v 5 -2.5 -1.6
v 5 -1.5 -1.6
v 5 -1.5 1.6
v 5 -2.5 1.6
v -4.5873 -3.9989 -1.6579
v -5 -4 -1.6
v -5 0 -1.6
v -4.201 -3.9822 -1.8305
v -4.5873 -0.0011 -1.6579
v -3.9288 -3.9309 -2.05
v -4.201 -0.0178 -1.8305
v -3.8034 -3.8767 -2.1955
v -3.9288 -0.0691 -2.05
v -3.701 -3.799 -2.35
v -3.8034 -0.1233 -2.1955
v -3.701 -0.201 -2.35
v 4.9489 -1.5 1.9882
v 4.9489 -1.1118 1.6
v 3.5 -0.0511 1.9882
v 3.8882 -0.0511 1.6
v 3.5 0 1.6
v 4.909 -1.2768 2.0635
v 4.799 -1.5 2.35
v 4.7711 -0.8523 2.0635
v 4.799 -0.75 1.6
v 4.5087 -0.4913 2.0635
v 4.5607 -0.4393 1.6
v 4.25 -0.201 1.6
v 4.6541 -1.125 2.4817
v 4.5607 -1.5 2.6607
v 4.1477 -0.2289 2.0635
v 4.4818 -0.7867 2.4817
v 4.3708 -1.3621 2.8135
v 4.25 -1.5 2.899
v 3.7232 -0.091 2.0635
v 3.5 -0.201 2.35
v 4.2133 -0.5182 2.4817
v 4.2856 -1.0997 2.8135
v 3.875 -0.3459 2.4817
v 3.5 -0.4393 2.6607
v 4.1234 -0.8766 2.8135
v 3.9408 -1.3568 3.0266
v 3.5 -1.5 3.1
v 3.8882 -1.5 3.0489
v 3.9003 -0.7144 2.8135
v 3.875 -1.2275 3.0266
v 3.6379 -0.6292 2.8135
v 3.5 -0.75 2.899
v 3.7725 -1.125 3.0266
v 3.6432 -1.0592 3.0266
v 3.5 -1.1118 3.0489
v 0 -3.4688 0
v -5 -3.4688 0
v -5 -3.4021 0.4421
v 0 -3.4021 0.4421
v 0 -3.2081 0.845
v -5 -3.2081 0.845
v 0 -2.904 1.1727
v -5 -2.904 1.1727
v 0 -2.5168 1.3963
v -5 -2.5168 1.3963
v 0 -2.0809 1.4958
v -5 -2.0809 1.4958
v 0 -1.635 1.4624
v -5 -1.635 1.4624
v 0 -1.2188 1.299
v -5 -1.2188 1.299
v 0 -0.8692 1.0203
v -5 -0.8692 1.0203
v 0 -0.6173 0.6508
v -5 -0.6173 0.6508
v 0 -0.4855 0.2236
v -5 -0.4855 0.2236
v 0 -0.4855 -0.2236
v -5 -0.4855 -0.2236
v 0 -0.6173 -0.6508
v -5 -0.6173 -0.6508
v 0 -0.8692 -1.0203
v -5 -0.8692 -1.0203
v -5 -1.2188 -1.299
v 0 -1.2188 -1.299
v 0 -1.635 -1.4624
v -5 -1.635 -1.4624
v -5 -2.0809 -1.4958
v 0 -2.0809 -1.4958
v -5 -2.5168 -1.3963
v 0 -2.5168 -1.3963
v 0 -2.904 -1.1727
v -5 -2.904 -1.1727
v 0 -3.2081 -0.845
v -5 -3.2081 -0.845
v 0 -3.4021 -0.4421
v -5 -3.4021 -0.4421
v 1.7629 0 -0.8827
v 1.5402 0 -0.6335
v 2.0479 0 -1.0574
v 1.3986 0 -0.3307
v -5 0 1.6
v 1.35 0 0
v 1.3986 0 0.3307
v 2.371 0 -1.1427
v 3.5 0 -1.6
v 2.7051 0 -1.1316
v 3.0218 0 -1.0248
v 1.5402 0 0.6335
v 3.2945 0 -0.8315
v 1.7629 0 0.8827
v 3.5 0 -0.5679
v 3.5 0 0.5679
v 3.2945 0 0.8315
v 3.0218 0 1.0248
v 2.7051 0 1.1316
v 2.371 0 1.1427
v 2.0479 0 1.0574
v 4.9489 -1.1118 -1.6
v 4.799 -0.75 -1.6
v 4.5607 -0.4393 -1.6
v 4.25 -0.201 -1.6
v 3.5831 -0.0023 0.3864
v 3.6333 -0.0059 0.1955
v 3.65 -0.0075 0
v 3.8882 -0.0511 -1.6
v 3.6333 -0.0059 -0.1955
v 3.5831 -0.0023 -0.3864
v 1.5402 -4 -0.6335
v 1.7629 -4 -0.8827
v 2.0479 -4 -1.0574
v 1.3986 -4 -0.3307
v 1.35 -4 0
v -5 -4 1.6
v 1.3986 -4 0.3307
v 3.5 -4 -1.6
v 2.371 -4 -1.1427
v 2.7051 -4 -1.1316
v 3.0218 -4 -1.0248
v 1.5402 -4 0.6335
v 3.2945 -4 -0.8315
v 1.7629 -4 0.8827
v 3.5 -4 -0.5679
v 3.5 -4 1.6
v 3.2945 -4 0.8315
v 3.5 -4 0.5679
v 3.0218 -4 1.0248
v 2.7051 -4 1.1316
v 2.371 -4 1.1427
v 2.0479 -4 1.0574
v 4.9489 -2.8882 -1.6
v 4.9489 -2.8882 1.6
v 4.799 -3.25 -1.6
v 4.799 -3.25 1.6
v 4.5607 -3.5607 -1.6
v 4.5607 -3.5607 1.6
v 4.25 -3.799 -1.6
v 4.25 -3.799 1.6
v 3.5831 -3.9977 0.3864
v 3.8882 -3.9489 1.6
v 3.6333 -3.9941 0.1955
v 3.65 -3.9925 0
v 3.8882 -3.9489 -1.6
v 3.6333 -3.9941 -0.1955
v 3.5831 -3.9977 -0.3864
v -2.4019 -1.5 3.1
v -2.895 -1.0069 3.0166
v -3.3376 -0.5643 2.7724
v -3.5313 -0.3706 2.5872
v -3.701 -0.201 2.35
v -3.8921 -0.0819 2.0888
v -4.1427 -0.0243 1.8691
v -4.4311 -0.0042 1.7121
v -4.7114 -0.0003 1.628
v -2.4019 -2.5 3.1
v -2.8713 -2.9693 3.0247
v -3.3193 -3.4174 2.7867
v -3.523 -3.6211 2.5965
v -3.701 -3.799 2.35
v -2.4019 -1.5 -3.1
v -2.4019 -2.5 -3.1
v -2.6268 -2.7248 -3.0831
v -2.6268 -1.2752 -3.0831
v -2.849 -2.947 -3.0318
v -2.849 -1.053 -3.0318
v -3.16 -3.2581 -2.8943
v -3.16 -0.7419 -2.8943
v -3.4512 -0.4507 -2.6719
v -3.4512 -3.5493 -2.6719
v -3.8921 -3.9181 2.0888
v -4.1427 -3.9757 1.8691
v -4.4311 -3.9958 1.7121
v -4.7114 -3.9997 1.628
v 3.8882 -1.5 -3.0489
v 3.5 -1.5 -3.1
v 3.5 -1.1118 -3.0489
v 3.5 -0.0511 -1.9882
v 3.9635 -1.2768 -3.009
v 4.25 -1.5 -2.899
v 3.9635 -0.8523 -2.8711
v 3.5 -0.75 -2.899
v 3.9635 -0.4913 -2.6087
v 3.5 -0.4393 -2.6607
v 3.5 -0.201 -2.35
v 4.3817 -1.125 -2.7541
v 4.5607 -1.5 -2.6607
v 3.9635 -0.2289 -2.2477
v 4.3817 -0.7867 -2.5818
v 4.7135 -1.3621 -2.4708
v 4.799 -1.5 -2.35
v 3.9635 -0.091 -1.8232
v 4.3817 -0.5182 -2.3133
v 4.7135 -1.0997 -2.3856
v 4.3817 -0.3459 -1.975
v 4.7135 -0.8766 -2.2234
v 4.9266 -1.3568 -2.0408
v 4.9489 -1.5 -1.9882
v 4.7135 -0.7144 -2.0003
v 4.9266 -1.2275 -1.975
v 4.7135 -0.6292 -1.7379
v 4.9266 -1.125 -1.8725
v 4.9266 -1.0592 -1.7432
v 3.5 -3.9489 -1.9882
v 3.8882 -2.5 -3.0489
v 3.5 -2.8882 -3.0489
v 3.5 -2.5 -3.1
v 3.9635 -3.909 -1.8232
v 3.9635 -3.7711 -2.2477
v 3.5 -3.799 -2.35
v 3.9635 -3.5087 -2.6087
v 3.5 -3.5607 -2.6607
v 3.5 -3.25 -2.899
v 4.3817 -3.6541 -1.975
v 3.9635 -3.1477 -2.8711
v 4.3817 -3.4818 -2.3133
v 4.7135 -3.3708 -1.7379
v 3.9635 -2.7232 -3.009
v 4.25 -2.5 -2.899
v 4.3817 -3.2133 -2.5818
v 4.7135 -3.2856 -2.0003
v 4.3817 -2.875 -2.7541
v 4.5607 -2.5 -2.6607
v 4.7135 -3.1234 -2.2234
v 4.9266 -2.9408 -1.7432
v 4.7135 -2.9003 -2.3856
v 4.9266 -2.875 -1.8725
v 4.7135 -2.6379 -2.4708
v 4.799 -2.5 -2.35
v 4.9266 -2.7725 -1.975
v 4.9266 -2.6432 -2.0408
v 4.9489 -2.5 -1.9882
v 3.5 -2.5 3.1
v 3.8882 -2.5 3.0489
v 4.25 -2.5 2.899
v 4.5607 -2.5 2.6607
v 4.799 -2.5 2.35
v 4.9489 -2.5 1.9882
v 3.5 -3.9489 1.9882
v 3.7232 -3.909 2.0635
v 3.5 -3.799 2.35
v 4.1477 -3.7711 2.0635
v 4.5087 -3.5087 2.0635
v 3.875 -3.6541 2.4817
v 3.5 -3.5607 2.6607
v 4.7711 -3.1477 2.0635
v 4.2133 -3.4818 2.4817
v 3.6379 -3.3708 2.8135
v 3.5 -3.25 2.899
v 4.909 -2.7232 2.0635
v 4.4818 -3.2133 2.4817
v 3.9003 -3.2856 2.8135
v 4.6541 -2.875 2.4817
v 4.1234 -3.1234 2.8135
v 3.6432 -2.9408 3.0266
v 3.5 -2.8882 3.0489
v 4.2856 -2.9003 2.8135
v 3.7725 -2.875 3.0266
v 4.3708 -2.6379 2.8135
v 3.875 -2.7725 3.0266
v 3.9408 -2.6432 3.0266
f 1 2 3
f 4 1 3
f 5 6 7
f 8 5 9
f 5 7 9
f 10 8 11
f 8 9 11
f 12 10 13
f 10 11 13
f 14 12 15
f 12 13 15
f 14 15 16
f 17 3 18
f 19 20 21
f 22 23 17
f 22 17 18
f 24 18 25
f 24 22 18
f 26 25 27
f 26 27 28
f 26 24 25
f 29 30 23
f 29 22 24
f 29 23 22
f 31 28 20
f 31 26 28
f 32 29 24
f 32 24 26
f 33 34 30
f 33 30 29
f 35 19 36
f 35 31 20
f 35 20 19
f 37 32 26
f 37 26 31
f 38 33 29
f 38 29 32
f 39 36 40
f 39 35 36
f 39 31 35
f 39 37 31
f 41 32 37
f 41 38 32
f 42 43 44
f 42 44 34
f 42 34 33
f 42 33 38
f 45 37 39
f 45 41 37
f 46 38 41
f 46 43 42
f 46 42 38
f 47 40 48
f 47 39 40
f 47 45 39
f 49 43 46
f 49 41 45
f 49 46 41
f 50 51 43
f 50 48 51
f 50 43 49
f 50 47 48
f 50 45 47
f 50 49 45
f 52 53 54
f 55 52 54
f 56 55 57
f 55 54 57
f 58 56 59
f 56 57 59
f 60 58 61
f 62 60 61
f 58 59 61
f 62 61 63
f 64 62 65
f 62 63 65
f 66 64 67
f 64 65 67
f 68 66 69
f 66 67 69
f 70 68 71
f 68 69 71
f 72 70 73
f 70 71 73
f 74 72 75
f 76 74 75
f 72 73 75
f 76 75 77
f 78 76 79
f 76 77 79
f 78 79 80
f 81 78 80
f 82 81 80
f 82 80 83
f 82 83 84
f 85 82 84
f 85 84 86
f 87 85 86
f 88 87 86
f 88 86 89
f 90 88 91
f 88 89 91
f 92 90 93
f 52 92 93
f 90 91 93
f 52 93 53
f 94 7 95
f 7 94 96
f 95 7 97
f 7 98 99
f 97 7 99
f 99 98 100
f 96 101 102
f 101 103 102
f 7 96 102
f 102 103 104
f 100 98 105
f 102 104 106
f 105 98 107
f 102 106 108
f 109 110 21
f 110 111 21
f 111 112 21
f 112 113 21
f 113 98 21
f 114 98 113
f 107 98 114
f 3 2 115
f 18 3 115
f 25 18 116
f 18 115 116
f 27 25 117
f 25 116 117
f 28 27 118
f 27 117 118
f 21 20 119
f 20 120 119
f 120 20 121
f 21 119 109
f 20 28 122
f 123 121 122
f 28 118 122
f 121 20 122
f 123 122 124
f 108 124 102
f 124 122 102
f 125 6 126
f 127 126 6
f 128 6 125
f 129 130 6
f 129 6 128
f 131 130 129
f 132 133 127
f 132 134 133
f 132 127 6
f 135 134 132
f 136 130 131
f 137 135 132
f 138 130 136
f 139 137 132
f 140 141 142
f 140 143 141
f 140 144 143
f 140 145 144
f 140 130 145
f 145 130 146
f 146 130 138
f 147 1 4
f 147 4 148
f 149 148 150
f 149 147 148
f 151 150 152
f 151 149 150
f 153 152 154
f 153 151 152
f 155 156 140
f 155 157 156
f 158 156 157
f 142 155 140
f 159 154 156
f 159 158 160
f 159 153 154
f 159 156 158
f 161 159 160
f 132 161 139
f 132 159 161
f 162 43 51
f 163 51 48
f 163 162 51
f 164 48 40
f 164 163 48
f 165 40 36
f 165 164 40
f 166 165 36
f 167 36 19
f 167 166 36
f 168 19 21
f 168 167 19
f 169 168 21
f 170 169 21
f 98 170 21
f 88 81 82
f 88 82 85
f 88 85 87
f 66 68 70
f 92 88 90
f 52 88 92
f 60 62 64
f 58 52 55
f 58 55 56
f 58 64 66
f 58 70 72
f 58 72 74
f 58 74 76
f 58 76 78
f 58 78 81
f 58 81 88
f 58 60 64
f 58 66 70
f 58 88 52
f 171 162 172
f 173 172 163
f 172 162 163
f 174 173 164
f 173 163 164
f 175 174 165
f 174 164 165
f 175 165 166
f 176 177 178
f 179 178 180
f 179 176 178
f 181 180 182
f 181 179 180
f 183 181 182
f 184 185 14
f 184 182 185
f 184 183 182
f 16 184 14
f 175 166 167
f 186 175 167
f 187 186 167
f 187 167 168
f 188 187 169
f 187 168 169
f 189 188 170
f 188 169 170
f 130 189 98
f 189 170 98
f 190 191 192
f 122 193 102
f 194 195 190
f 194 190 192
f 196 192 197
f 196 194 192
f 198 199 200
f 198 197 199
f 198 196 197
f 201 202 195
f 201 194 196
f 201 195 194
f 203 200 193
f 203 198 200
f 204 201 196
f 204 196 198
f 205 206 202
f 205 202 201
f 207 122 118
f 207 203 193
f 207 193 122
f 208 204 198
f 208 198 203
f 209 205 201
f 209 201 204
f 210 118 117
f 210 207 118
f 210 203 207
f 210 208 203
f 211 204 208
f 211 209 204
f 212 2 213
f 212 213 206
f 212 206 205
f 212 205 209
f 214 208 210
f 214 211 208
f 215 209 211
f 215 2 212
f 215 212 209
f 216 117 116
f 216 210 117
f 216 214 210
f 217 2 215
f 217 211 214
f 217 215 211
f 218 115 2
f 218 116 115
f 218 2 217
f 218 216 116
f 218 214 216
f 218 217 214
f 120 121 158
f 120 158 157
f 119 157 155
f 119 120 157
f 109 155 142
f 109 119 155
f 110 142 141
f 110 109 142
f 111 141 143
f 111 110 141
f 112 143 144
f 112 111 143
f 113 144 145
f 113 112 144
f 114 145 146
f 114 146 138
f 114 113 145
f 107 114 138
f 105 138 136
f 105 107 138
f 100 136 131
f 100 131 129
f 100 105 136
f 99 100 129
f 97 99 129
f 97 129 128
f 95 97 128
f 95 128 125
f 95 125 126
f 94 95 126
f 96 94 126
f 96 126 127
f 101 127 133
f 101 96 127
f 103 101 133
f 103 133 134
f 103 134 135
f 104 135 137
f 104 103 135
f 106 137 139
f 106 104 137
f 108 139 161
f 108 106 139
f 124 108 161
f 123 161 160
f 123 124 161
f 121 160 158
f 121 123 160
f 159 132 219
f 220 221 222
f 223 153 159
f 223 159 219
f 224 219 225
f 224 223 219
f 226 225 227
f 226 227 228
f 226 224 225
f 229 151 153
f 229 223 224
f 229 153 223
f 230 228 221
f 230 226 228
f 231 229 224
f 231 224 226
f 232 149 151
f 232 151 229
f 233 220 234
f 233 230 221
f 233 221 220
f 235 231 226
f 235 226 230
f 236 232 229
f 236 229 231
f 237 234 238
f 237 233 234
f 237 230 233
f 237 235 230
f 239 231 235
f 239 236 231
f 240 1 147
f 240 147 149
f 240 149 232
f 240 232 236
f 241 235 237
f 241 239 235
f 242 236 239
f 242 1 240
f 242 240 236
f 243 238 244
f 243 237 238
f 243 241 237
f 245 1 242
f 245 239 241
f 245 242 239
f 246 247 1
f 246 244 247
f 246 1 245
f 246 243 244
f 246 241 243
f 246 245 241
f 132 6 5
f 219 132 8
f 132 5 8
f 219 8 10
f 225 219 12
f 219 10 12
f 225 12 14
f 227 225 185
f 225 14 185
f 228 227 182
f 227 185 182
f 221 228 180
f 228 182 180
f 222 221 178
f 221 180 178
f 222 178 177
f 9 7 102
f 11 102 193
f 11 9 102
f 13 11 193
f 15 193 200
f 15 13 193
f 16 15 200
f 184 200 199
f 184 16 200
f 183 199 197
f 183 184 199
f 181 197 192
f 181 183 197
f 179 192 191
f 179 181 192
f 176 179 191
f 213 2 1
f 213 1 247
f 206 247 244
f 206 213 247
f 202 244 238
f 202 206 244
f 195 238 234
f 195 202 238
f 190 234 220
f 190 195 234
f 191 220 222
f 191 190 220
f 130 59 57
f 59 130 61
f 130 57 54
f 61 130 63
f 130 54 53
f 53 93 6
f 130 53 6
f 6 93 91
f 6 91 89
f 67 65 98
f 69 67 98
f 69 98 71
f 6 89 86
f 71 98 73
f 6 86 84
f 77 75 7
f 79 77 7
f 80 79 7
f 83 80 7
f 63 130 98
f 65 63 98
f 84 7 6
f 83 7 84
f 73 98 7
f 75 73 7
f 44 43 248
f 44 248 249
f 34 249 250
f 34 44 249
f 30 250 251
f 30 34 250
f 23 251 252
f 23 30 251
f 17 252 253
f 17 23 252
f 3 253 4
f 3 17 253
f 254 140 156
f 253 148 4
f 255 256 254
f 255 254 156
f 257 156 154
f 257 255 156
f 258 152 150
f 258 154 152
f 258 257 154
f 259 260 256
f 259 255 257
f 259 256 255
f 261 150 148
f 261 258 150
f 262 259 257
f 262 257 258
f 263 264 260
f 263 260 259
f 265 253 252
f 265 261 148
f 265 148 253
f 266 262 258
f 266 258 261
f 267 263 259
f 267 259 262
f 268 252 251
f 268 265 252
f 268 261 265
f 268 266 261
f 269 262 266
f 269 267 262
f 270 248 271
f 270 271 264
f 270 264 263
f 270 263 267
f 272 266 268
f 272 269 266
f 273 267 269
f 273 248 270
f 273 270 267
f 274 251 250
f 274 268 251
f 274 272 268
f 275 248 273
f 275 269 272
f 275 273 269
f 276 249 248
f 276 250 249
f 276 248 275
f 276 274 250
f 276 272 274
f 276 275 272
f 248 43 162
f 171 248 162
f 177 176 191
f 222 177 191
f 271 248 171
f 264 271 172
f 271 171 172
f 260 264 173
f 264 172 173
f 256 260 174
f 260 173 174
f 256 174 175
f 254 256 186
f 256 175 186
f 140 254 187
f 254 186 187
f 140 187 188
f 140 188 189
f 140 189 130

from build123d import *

# Parameters (mm, degrees)
F0_R         = 1.15
F1_DEPTH     = 4
F2_R         = 1.5
F3_DEPTH     = 5
F4_T1_DEPTH  = 9.4903810568
F4_T3_DEPTH  = 1
F4_T5_DEPTH  = 10.75
F4_T7_DEPTH  = 3.2
F4_S11_W     = 1.5
F4_S11_H     = 1.5
F4_T12_DEPTH = 1.5
F4_S17_W     = 1.5
F4_S17_H     = 1.5
F4_T18_DEPTH = 1.5
F4_S23_W     = 1.5
F4_S23_H     = 1.5
F4_T24_DEPTH = 1.5
F4_S29_W     = 1.5
F4_S29_H     = 1.5
F4_T30_DEPTH = 1.5


# Not quite as in the source:
# - a fillet or chamfer that OpenCascade refuses, or shapes differently, is made with other operations: its cross-section is extruded or revolved along the edge and cut away or added


with BuildPart() as f1:
    # F0 (on Front) → F1 (new body)
    with BuildSketch(Plane.XZ):
        with BuildLine():
            Line((5, 3.1), (-3.5, 3.1))
            ThreePointArc((-3.5, 3.1), (-3.9393398282, 2.0393398282), (-5, 1.6))
            Line((-5, 1.6), (-5, -1.6))
            ThreePointArc((-5, -1.6), (-3.9393398282, -2.0393398282), (-3.5, -3.1))
            Line((-3.5, -3.1), (5, -3.1))
            Line((5, -3.1), (5, 3.1))
        make_face()
        with Locations((2.5, 0)):
            Circle(F0_R, mode=Mode.SUBTRACT)
    extrude(amount=F1_DEPTH)

    # F2 (on face) → F3 (cut)
    with BuildSketch(Plane(origin=(-5, 0, 0), x_dir=(0, -1, 0), z_dir=(-1, 0, 0))):
        with Locations((1.9687709864, 0)):
            Circle(F2_R)
    extrude(amount=-F3_DEPTH, mode=Mode.SUBTRACT)

    # F4: fillet of radius 1.5 on 10 edges, made by hand

    # F4_s2 → F4_t1 (cut)
    with BuildSketch(Plane.XZ.offset(-2.7451905284)):
        with BuildLine():
            ThreePointArc((-2.4019237886, 3.1), (-3.1519237886, 2.8990381057), (-3.7009618943, 2.35))
            ThreePointArc((-3.7009618943, 2.35), (-3.5511112606, 2.7117714323), (-3.5, 3.1))
            Line((-3.5, 3.1), (-2.4019237886, 3.1))
        make_face()
        with BuildLine():
            ThreePointArc((-2.4019237886, -3.1), (-3.1519237886, -2.8990381057), (-3.7009618943, -2.35))
            ThreePointArc((-3.7009618943, -2.35), (-3.5511112606, -2.7117714323), (-3.5, -3.1))
            Line((-3.5, -3.1), (-2.4019237886, -3.1))
        make_face()
    extrude(amount=F4_T1_DEPTH, mode=Mode.SUBTRACT)

    # F4_s4 → F4_t3 (cut)
    with BuildSketch(Plane.XZ.offset(1.5)):
        with BuildLine():
            ThreePointArc((3.5, 3.1), (4.5606601718, 2.6606601718), (5, 1.6))
            Line((5, 1.6), (5, 3.1))
            Line((5, 3.1), (3.5, 3.1))
        make_face()
        with BuildLine():
            ThreePointArc((5, -1.6), (4.5606601718, -2.6606601718), (3.5, -3.1))
            Line((3.5, -3.1), (5, -3.1))
            Line((5, -3.1), (5, -1.6))
        make_face()
    extrude(amount=F4_T3_DEPTH, mode=Mode.SUBTRACT)

    # F4_s6 → F4_t5 (cut)
    with BuildSketch(Plane.YZ.offset(-7.25)):
        with BuildLine():
            ThreePointArc((-2.5, 3.1), (-3.5606601718, 2.6606601718), (-4, 1.6))
            Line((-4, 1.6), (-4, 3.1))
            Line((-4, 3.1), (-2.5, 3.1))
        make_face()
        with BuildLine():
            ThreePointArc((-1.5, 3.1), (-0.4393398282, 2.6606601718), (0, 1.6))
            Line((0, 1.6), (0, 3.1))
            Line((0, 3.1), (-1.5, 3.1))
        make_face()
        with BuildLine():
            ThreePointArc((0, -1.6), (-0.4393398282, -2.6606601718), (-1.5, -3.1))
            Line((-1.5, -3.1), (0, -3.1))
            Line((0, -3.1), (0, -1.6))
        make_face()
        with BuildLine():
            ThreePointArc((-4, -1.6), (-3.5606601718, -2.6606601718), (-2.5, -3.1))
            Line((-2.5, -3.1), (-4, -3.1))
            Line((-4, -3.1), (-4, -1.6))
        make_face()
    extrude(amount=F4_T5_DEPTH, mode=Mode.SUBTRACT)

    # F4_s8 → F4_t7 (cut)
    with BuildSketch(Plane.XY.offset(-1.6)):
        with BuildLine():
            ThreePointArc((5, -1.5), (4.5606601718, -0.4393398282), (3.5, 0))
            Line((3.5, 0), (5, 0))
            Line((5, 0), (5, -1.5))
        make_face()
        with BuildLine():
            ThreePointArc((5, -2.5), (4.5606601718, -3.5606601718), (3.5, -4))
            Line((3.5, -4), (5, -4))
            Line((5, -4), (5, -2.5))
        make_face()
    extrude(amount=F4_T7_DEPTH, mode=Mode.SUBTRACT)


with BuildPart() as f4_tool10:
    # F4_s11 → F4_t12 (new body)
    with BuildSketch(Plane.XY.offset(1.6)):
        with Locations((4.25, -0.75)):
            Rectangle(F4_S11_W, F4_S11_H)
    extrude(amount=F4_T12_DEPTH)

    # F4_s13 → F4_t14 (revolve, cut)
    with BuildSketch(Plane(origin=(3.5, -1.5, 1.6), x_dir=(-0.7071067812, -0.7071067812, 0), z_dir=(-0.7071067812, 0.7071067812, 0))):
        with BuildLine():
            ThreePointArc((0, -1.5), (1.5, 0), (0, 1.5))
            Line((0, 1.5), (0, -1.5))
        make_face()
    revolve(axis=Axis((3.5, -1.5, 1.6), (0, 0, 1)), mode=Mode.SUBTRACT)


with BuildPart() as f1_1:
    add(f1.part)

    # F4_t9: cut F4_tool10
    add(f4_tool10.part, mode=Mode.SUBTRACT)


with BuildPart() as f4_tool16:
    # F4_s17 → F4_t18 (new body)
    with BuildSketch(Plane.XY.offset(1.6)):
        with Locations((4.25, -3.25)):
            Rectangle(F4_S17_W, F4_S17_H)
    extrude(amount=F4_T18_DEPTH)

    # F4_s19 → F4_t20 (revolve, cut)
    with BuildSketch(Plane(origin=(3.5, -2.5, 1.6), x_dir=(-0.7071067812, 0.7071067812, 0), z_dir=(0.7071067812, 0.7071067812, 0))):
        with BuildLine():
            ThreePointArc((0, -1.5), (1.5, 0), (0, 1.5))
            Line((0, 1.5), (0, -1.5))
        make_face()
    revolve(axis=Axis((3.5, -2.5, 1.6), (0, 0, 1)), mode=Mode.SUBTRACT)


with BuildPart() as f1_2:
    add(f1_1.part)

    # F4_t15: cut F4_tool16
    add(f4_tool16.part, mode=Mode.SUBTRACT)


with BuildPart() as f4_tool22:
    # F4_s23 → F4_t24 (new body)
    with BuildSketch(Plane.YZ.offset(3.5)):
        with Locations((-0.75, -2.35)):
            Rectangle(F4_S23_W, F4_S23_H)
    extrude(amount=F4_T24_DEPTH)

    # F4_s25 → F4_t26 (revolve, cut)
    with BuildSketch(Plane(origin=(3.5, -1.5, -1.6), x_dir=(0, -0.7071067812, 0.7071067812), z_dir=(0, 0.7071067812, 0.7071067812))):
        with BuildLine():
            ThreePointArc((0, -1.5), (1.5, 0), (0, 1.5))
            Line((0, 1.5), (0, -1.5))
        make_face()
    revolve(axis=Axis((3.5, -1.5, -1.6), (1, 0, 0)), mode=Mode.SUBTRACT)


with BuildPart() as f1_3:
    add(f1_2.part)

    # F4_t21: cut F4_tool22
    add(f4_tool22.part, mode=Mode.SUBTRACT)


with BuildPart() as f4_tool28:
    # F4_s29 → F4_t30 (new body)
    with BuildSketch(Plane.YZ.offset(3.5)):
        with Locations((-3.25, -2.35)):
            Rectangle(F4_S29_W, F4_S29_H)
    extrude(amount=F4_T30_DEPTH)

    # F4_s31 → F4_t32 (revolve, cut)
    with BuildSketch(Plane(origin=(3.5, -2.5, -1.6), x_dir=(0, 0.7071067812, 0.7071067812), z_dir=(0, 0.7071067812, -0.7071067812))):
        with BuildLine():
            ThreePointArc((0, -1.5), (1.5, 0), (0, 1.5))
            Line((0, 1.5), (0, -1.5))
        make_face()
    revolve(axis=Axis((3.5, -2.5, -1.6), (1, 0, 0)), mode=Mode.SUBTRACT)


with BuildPart() as f1_4:
    add(f1_3.part)

    # F4_t27: cut F4_tool28
    add(f4_tool28.part, mode=Mode.SUBTRACT)


solid = f1_4.part
